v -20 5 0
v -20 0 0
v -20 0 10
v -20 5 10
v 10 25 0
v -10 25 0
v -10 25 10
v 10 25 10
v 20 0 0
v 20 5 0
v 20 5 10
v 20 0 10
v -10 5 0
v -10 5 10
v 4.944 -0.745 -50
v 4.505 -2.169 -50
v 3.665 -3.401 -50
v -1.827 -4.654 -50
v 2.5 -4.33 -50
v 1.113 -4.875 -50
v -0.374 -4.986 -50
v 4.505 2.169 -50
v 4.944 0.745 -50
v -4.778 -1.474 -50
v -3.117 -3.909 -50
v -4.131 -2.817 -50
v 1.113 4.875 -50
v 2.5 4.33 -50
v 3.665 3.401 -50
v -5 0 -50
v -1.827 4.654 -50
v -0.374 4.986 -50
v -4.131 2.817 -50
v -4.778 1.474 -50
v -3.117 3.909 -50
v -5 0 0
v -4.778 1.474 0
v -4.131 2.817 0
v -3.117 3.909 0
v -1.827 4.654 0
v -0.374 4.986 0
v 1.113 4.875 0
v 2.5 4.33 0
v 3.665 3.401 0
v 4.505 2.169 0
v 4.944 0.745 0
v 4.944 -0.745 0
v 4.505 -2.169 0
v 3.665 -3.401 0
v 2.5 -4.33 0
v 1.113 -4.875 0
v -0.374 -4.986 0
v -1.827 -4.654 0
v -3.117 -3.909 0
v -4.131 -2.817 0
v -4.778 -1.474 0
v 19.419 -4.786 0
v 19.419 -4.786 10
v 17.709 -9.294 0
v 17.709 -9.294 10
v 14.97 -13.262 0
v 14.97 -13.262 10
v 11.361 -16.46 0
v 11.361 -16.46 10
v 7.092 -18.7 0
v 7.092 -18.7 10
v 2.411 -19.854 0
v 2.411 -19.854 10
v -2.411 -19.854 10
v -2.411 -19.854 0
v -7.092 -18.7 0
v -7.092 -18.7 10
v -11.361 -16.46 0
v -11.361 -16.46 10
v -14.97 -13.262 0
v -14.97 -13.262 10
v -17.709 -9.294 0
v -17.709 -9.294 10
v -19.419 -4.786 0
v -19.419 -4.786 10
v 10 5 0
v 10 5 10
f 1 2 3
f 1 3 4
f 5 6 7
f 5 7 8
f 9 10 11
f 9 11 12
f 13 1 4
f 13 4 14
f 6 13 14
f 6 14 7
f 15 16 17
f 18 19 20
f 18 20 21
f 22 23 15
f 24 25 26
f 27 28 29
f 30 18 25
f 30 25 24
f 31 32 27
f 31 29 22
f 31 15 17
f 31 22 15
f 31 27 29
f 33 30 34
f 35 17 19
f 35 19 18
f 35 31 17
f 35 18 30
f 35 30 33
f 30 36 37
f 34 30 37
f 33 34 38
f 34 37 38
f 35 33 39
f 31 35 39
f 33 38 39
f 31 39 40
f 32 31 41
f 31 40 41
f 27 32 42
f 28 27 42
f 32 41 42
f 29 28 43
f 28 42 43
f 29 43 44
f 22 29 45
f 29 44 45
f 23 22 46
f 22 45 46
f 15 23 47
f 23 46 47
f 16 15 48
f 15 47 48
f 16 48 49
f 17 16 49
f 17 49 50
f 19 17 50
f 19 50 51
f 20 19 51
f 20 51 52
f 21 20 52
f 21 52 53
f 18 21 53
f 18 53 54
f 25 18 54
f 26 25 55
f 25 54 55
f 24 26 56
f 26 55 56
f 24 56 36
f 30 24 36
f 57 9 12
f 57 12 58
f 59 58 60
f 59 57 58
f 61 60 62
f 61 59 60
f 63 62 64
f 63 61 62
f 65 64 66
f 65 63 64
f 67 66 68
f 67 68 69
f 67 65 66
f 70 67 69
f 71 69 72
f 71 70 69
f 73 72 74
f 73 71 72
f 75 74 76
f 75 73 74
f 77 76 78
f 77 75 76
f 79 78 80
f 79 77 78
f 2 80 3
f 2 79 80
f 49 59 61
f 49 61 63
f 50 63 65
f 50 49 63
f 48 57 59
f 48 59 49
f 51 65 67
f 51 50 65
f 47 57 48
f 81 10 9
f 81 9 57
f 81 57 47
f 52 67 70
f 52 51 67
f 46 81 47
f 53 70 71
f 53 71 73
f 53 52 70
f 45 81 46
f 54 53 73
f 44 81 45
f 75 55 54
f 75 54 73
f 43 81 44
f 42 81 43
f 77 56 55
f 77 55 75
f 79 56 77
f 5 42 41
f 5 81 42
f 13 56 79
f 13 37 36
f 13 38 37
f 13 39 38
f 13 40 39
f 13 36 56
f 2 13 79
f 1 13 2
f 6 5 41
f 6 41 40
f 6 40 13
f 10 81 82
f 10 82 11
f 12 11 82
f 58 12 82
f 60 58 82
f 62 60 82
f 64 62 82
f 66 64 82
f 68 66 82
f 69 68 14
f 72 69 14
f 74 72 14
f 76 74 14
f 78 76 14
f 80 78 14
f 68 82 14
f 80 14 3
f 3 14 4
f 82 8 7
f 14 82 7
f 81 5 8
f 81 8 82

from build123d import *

# Parameters (mm, degrees)
BOSS_EXTRU_1_DEPTH = 10
ESQUISSE2_R        = 5
BOSS_EXTRU_2_DEPTH = 50


with BuildPart() as part:
    # Esquisse1 → Boss.-Extru.1 (new body)
    with BuildSketch(Plane.XY):
        with BuildLine():
            Line((-20, 0), (-20, 5))
            Line((-20, 5), (-10, 5))
            Line((-10, 5), (-10, 25))
            Line((-10, 25), (10, 25))
            Line((10, 25), (10, 5))
            Line((10, 5), (20, 5))
            Line((20, 5), (20, 0))
            ThreePointArc((20, 0), (0, -20), (-20, 0))
        make_face()
    extrude(amount=BOSS_EXTRU_1_DEPTH)

    # Esquisse2 → Boss.-Extru.2 (add)
    with BuildSketch(Plane(origin=(0, 0, 0), x_dir=(-1, 0, 0), z_dir=(0, 0, -1))):
        Circle(ESQUISSE2_R)
    extrude(amount=BOSS_EXTRU_2_DEPTH)


solid = part.part
